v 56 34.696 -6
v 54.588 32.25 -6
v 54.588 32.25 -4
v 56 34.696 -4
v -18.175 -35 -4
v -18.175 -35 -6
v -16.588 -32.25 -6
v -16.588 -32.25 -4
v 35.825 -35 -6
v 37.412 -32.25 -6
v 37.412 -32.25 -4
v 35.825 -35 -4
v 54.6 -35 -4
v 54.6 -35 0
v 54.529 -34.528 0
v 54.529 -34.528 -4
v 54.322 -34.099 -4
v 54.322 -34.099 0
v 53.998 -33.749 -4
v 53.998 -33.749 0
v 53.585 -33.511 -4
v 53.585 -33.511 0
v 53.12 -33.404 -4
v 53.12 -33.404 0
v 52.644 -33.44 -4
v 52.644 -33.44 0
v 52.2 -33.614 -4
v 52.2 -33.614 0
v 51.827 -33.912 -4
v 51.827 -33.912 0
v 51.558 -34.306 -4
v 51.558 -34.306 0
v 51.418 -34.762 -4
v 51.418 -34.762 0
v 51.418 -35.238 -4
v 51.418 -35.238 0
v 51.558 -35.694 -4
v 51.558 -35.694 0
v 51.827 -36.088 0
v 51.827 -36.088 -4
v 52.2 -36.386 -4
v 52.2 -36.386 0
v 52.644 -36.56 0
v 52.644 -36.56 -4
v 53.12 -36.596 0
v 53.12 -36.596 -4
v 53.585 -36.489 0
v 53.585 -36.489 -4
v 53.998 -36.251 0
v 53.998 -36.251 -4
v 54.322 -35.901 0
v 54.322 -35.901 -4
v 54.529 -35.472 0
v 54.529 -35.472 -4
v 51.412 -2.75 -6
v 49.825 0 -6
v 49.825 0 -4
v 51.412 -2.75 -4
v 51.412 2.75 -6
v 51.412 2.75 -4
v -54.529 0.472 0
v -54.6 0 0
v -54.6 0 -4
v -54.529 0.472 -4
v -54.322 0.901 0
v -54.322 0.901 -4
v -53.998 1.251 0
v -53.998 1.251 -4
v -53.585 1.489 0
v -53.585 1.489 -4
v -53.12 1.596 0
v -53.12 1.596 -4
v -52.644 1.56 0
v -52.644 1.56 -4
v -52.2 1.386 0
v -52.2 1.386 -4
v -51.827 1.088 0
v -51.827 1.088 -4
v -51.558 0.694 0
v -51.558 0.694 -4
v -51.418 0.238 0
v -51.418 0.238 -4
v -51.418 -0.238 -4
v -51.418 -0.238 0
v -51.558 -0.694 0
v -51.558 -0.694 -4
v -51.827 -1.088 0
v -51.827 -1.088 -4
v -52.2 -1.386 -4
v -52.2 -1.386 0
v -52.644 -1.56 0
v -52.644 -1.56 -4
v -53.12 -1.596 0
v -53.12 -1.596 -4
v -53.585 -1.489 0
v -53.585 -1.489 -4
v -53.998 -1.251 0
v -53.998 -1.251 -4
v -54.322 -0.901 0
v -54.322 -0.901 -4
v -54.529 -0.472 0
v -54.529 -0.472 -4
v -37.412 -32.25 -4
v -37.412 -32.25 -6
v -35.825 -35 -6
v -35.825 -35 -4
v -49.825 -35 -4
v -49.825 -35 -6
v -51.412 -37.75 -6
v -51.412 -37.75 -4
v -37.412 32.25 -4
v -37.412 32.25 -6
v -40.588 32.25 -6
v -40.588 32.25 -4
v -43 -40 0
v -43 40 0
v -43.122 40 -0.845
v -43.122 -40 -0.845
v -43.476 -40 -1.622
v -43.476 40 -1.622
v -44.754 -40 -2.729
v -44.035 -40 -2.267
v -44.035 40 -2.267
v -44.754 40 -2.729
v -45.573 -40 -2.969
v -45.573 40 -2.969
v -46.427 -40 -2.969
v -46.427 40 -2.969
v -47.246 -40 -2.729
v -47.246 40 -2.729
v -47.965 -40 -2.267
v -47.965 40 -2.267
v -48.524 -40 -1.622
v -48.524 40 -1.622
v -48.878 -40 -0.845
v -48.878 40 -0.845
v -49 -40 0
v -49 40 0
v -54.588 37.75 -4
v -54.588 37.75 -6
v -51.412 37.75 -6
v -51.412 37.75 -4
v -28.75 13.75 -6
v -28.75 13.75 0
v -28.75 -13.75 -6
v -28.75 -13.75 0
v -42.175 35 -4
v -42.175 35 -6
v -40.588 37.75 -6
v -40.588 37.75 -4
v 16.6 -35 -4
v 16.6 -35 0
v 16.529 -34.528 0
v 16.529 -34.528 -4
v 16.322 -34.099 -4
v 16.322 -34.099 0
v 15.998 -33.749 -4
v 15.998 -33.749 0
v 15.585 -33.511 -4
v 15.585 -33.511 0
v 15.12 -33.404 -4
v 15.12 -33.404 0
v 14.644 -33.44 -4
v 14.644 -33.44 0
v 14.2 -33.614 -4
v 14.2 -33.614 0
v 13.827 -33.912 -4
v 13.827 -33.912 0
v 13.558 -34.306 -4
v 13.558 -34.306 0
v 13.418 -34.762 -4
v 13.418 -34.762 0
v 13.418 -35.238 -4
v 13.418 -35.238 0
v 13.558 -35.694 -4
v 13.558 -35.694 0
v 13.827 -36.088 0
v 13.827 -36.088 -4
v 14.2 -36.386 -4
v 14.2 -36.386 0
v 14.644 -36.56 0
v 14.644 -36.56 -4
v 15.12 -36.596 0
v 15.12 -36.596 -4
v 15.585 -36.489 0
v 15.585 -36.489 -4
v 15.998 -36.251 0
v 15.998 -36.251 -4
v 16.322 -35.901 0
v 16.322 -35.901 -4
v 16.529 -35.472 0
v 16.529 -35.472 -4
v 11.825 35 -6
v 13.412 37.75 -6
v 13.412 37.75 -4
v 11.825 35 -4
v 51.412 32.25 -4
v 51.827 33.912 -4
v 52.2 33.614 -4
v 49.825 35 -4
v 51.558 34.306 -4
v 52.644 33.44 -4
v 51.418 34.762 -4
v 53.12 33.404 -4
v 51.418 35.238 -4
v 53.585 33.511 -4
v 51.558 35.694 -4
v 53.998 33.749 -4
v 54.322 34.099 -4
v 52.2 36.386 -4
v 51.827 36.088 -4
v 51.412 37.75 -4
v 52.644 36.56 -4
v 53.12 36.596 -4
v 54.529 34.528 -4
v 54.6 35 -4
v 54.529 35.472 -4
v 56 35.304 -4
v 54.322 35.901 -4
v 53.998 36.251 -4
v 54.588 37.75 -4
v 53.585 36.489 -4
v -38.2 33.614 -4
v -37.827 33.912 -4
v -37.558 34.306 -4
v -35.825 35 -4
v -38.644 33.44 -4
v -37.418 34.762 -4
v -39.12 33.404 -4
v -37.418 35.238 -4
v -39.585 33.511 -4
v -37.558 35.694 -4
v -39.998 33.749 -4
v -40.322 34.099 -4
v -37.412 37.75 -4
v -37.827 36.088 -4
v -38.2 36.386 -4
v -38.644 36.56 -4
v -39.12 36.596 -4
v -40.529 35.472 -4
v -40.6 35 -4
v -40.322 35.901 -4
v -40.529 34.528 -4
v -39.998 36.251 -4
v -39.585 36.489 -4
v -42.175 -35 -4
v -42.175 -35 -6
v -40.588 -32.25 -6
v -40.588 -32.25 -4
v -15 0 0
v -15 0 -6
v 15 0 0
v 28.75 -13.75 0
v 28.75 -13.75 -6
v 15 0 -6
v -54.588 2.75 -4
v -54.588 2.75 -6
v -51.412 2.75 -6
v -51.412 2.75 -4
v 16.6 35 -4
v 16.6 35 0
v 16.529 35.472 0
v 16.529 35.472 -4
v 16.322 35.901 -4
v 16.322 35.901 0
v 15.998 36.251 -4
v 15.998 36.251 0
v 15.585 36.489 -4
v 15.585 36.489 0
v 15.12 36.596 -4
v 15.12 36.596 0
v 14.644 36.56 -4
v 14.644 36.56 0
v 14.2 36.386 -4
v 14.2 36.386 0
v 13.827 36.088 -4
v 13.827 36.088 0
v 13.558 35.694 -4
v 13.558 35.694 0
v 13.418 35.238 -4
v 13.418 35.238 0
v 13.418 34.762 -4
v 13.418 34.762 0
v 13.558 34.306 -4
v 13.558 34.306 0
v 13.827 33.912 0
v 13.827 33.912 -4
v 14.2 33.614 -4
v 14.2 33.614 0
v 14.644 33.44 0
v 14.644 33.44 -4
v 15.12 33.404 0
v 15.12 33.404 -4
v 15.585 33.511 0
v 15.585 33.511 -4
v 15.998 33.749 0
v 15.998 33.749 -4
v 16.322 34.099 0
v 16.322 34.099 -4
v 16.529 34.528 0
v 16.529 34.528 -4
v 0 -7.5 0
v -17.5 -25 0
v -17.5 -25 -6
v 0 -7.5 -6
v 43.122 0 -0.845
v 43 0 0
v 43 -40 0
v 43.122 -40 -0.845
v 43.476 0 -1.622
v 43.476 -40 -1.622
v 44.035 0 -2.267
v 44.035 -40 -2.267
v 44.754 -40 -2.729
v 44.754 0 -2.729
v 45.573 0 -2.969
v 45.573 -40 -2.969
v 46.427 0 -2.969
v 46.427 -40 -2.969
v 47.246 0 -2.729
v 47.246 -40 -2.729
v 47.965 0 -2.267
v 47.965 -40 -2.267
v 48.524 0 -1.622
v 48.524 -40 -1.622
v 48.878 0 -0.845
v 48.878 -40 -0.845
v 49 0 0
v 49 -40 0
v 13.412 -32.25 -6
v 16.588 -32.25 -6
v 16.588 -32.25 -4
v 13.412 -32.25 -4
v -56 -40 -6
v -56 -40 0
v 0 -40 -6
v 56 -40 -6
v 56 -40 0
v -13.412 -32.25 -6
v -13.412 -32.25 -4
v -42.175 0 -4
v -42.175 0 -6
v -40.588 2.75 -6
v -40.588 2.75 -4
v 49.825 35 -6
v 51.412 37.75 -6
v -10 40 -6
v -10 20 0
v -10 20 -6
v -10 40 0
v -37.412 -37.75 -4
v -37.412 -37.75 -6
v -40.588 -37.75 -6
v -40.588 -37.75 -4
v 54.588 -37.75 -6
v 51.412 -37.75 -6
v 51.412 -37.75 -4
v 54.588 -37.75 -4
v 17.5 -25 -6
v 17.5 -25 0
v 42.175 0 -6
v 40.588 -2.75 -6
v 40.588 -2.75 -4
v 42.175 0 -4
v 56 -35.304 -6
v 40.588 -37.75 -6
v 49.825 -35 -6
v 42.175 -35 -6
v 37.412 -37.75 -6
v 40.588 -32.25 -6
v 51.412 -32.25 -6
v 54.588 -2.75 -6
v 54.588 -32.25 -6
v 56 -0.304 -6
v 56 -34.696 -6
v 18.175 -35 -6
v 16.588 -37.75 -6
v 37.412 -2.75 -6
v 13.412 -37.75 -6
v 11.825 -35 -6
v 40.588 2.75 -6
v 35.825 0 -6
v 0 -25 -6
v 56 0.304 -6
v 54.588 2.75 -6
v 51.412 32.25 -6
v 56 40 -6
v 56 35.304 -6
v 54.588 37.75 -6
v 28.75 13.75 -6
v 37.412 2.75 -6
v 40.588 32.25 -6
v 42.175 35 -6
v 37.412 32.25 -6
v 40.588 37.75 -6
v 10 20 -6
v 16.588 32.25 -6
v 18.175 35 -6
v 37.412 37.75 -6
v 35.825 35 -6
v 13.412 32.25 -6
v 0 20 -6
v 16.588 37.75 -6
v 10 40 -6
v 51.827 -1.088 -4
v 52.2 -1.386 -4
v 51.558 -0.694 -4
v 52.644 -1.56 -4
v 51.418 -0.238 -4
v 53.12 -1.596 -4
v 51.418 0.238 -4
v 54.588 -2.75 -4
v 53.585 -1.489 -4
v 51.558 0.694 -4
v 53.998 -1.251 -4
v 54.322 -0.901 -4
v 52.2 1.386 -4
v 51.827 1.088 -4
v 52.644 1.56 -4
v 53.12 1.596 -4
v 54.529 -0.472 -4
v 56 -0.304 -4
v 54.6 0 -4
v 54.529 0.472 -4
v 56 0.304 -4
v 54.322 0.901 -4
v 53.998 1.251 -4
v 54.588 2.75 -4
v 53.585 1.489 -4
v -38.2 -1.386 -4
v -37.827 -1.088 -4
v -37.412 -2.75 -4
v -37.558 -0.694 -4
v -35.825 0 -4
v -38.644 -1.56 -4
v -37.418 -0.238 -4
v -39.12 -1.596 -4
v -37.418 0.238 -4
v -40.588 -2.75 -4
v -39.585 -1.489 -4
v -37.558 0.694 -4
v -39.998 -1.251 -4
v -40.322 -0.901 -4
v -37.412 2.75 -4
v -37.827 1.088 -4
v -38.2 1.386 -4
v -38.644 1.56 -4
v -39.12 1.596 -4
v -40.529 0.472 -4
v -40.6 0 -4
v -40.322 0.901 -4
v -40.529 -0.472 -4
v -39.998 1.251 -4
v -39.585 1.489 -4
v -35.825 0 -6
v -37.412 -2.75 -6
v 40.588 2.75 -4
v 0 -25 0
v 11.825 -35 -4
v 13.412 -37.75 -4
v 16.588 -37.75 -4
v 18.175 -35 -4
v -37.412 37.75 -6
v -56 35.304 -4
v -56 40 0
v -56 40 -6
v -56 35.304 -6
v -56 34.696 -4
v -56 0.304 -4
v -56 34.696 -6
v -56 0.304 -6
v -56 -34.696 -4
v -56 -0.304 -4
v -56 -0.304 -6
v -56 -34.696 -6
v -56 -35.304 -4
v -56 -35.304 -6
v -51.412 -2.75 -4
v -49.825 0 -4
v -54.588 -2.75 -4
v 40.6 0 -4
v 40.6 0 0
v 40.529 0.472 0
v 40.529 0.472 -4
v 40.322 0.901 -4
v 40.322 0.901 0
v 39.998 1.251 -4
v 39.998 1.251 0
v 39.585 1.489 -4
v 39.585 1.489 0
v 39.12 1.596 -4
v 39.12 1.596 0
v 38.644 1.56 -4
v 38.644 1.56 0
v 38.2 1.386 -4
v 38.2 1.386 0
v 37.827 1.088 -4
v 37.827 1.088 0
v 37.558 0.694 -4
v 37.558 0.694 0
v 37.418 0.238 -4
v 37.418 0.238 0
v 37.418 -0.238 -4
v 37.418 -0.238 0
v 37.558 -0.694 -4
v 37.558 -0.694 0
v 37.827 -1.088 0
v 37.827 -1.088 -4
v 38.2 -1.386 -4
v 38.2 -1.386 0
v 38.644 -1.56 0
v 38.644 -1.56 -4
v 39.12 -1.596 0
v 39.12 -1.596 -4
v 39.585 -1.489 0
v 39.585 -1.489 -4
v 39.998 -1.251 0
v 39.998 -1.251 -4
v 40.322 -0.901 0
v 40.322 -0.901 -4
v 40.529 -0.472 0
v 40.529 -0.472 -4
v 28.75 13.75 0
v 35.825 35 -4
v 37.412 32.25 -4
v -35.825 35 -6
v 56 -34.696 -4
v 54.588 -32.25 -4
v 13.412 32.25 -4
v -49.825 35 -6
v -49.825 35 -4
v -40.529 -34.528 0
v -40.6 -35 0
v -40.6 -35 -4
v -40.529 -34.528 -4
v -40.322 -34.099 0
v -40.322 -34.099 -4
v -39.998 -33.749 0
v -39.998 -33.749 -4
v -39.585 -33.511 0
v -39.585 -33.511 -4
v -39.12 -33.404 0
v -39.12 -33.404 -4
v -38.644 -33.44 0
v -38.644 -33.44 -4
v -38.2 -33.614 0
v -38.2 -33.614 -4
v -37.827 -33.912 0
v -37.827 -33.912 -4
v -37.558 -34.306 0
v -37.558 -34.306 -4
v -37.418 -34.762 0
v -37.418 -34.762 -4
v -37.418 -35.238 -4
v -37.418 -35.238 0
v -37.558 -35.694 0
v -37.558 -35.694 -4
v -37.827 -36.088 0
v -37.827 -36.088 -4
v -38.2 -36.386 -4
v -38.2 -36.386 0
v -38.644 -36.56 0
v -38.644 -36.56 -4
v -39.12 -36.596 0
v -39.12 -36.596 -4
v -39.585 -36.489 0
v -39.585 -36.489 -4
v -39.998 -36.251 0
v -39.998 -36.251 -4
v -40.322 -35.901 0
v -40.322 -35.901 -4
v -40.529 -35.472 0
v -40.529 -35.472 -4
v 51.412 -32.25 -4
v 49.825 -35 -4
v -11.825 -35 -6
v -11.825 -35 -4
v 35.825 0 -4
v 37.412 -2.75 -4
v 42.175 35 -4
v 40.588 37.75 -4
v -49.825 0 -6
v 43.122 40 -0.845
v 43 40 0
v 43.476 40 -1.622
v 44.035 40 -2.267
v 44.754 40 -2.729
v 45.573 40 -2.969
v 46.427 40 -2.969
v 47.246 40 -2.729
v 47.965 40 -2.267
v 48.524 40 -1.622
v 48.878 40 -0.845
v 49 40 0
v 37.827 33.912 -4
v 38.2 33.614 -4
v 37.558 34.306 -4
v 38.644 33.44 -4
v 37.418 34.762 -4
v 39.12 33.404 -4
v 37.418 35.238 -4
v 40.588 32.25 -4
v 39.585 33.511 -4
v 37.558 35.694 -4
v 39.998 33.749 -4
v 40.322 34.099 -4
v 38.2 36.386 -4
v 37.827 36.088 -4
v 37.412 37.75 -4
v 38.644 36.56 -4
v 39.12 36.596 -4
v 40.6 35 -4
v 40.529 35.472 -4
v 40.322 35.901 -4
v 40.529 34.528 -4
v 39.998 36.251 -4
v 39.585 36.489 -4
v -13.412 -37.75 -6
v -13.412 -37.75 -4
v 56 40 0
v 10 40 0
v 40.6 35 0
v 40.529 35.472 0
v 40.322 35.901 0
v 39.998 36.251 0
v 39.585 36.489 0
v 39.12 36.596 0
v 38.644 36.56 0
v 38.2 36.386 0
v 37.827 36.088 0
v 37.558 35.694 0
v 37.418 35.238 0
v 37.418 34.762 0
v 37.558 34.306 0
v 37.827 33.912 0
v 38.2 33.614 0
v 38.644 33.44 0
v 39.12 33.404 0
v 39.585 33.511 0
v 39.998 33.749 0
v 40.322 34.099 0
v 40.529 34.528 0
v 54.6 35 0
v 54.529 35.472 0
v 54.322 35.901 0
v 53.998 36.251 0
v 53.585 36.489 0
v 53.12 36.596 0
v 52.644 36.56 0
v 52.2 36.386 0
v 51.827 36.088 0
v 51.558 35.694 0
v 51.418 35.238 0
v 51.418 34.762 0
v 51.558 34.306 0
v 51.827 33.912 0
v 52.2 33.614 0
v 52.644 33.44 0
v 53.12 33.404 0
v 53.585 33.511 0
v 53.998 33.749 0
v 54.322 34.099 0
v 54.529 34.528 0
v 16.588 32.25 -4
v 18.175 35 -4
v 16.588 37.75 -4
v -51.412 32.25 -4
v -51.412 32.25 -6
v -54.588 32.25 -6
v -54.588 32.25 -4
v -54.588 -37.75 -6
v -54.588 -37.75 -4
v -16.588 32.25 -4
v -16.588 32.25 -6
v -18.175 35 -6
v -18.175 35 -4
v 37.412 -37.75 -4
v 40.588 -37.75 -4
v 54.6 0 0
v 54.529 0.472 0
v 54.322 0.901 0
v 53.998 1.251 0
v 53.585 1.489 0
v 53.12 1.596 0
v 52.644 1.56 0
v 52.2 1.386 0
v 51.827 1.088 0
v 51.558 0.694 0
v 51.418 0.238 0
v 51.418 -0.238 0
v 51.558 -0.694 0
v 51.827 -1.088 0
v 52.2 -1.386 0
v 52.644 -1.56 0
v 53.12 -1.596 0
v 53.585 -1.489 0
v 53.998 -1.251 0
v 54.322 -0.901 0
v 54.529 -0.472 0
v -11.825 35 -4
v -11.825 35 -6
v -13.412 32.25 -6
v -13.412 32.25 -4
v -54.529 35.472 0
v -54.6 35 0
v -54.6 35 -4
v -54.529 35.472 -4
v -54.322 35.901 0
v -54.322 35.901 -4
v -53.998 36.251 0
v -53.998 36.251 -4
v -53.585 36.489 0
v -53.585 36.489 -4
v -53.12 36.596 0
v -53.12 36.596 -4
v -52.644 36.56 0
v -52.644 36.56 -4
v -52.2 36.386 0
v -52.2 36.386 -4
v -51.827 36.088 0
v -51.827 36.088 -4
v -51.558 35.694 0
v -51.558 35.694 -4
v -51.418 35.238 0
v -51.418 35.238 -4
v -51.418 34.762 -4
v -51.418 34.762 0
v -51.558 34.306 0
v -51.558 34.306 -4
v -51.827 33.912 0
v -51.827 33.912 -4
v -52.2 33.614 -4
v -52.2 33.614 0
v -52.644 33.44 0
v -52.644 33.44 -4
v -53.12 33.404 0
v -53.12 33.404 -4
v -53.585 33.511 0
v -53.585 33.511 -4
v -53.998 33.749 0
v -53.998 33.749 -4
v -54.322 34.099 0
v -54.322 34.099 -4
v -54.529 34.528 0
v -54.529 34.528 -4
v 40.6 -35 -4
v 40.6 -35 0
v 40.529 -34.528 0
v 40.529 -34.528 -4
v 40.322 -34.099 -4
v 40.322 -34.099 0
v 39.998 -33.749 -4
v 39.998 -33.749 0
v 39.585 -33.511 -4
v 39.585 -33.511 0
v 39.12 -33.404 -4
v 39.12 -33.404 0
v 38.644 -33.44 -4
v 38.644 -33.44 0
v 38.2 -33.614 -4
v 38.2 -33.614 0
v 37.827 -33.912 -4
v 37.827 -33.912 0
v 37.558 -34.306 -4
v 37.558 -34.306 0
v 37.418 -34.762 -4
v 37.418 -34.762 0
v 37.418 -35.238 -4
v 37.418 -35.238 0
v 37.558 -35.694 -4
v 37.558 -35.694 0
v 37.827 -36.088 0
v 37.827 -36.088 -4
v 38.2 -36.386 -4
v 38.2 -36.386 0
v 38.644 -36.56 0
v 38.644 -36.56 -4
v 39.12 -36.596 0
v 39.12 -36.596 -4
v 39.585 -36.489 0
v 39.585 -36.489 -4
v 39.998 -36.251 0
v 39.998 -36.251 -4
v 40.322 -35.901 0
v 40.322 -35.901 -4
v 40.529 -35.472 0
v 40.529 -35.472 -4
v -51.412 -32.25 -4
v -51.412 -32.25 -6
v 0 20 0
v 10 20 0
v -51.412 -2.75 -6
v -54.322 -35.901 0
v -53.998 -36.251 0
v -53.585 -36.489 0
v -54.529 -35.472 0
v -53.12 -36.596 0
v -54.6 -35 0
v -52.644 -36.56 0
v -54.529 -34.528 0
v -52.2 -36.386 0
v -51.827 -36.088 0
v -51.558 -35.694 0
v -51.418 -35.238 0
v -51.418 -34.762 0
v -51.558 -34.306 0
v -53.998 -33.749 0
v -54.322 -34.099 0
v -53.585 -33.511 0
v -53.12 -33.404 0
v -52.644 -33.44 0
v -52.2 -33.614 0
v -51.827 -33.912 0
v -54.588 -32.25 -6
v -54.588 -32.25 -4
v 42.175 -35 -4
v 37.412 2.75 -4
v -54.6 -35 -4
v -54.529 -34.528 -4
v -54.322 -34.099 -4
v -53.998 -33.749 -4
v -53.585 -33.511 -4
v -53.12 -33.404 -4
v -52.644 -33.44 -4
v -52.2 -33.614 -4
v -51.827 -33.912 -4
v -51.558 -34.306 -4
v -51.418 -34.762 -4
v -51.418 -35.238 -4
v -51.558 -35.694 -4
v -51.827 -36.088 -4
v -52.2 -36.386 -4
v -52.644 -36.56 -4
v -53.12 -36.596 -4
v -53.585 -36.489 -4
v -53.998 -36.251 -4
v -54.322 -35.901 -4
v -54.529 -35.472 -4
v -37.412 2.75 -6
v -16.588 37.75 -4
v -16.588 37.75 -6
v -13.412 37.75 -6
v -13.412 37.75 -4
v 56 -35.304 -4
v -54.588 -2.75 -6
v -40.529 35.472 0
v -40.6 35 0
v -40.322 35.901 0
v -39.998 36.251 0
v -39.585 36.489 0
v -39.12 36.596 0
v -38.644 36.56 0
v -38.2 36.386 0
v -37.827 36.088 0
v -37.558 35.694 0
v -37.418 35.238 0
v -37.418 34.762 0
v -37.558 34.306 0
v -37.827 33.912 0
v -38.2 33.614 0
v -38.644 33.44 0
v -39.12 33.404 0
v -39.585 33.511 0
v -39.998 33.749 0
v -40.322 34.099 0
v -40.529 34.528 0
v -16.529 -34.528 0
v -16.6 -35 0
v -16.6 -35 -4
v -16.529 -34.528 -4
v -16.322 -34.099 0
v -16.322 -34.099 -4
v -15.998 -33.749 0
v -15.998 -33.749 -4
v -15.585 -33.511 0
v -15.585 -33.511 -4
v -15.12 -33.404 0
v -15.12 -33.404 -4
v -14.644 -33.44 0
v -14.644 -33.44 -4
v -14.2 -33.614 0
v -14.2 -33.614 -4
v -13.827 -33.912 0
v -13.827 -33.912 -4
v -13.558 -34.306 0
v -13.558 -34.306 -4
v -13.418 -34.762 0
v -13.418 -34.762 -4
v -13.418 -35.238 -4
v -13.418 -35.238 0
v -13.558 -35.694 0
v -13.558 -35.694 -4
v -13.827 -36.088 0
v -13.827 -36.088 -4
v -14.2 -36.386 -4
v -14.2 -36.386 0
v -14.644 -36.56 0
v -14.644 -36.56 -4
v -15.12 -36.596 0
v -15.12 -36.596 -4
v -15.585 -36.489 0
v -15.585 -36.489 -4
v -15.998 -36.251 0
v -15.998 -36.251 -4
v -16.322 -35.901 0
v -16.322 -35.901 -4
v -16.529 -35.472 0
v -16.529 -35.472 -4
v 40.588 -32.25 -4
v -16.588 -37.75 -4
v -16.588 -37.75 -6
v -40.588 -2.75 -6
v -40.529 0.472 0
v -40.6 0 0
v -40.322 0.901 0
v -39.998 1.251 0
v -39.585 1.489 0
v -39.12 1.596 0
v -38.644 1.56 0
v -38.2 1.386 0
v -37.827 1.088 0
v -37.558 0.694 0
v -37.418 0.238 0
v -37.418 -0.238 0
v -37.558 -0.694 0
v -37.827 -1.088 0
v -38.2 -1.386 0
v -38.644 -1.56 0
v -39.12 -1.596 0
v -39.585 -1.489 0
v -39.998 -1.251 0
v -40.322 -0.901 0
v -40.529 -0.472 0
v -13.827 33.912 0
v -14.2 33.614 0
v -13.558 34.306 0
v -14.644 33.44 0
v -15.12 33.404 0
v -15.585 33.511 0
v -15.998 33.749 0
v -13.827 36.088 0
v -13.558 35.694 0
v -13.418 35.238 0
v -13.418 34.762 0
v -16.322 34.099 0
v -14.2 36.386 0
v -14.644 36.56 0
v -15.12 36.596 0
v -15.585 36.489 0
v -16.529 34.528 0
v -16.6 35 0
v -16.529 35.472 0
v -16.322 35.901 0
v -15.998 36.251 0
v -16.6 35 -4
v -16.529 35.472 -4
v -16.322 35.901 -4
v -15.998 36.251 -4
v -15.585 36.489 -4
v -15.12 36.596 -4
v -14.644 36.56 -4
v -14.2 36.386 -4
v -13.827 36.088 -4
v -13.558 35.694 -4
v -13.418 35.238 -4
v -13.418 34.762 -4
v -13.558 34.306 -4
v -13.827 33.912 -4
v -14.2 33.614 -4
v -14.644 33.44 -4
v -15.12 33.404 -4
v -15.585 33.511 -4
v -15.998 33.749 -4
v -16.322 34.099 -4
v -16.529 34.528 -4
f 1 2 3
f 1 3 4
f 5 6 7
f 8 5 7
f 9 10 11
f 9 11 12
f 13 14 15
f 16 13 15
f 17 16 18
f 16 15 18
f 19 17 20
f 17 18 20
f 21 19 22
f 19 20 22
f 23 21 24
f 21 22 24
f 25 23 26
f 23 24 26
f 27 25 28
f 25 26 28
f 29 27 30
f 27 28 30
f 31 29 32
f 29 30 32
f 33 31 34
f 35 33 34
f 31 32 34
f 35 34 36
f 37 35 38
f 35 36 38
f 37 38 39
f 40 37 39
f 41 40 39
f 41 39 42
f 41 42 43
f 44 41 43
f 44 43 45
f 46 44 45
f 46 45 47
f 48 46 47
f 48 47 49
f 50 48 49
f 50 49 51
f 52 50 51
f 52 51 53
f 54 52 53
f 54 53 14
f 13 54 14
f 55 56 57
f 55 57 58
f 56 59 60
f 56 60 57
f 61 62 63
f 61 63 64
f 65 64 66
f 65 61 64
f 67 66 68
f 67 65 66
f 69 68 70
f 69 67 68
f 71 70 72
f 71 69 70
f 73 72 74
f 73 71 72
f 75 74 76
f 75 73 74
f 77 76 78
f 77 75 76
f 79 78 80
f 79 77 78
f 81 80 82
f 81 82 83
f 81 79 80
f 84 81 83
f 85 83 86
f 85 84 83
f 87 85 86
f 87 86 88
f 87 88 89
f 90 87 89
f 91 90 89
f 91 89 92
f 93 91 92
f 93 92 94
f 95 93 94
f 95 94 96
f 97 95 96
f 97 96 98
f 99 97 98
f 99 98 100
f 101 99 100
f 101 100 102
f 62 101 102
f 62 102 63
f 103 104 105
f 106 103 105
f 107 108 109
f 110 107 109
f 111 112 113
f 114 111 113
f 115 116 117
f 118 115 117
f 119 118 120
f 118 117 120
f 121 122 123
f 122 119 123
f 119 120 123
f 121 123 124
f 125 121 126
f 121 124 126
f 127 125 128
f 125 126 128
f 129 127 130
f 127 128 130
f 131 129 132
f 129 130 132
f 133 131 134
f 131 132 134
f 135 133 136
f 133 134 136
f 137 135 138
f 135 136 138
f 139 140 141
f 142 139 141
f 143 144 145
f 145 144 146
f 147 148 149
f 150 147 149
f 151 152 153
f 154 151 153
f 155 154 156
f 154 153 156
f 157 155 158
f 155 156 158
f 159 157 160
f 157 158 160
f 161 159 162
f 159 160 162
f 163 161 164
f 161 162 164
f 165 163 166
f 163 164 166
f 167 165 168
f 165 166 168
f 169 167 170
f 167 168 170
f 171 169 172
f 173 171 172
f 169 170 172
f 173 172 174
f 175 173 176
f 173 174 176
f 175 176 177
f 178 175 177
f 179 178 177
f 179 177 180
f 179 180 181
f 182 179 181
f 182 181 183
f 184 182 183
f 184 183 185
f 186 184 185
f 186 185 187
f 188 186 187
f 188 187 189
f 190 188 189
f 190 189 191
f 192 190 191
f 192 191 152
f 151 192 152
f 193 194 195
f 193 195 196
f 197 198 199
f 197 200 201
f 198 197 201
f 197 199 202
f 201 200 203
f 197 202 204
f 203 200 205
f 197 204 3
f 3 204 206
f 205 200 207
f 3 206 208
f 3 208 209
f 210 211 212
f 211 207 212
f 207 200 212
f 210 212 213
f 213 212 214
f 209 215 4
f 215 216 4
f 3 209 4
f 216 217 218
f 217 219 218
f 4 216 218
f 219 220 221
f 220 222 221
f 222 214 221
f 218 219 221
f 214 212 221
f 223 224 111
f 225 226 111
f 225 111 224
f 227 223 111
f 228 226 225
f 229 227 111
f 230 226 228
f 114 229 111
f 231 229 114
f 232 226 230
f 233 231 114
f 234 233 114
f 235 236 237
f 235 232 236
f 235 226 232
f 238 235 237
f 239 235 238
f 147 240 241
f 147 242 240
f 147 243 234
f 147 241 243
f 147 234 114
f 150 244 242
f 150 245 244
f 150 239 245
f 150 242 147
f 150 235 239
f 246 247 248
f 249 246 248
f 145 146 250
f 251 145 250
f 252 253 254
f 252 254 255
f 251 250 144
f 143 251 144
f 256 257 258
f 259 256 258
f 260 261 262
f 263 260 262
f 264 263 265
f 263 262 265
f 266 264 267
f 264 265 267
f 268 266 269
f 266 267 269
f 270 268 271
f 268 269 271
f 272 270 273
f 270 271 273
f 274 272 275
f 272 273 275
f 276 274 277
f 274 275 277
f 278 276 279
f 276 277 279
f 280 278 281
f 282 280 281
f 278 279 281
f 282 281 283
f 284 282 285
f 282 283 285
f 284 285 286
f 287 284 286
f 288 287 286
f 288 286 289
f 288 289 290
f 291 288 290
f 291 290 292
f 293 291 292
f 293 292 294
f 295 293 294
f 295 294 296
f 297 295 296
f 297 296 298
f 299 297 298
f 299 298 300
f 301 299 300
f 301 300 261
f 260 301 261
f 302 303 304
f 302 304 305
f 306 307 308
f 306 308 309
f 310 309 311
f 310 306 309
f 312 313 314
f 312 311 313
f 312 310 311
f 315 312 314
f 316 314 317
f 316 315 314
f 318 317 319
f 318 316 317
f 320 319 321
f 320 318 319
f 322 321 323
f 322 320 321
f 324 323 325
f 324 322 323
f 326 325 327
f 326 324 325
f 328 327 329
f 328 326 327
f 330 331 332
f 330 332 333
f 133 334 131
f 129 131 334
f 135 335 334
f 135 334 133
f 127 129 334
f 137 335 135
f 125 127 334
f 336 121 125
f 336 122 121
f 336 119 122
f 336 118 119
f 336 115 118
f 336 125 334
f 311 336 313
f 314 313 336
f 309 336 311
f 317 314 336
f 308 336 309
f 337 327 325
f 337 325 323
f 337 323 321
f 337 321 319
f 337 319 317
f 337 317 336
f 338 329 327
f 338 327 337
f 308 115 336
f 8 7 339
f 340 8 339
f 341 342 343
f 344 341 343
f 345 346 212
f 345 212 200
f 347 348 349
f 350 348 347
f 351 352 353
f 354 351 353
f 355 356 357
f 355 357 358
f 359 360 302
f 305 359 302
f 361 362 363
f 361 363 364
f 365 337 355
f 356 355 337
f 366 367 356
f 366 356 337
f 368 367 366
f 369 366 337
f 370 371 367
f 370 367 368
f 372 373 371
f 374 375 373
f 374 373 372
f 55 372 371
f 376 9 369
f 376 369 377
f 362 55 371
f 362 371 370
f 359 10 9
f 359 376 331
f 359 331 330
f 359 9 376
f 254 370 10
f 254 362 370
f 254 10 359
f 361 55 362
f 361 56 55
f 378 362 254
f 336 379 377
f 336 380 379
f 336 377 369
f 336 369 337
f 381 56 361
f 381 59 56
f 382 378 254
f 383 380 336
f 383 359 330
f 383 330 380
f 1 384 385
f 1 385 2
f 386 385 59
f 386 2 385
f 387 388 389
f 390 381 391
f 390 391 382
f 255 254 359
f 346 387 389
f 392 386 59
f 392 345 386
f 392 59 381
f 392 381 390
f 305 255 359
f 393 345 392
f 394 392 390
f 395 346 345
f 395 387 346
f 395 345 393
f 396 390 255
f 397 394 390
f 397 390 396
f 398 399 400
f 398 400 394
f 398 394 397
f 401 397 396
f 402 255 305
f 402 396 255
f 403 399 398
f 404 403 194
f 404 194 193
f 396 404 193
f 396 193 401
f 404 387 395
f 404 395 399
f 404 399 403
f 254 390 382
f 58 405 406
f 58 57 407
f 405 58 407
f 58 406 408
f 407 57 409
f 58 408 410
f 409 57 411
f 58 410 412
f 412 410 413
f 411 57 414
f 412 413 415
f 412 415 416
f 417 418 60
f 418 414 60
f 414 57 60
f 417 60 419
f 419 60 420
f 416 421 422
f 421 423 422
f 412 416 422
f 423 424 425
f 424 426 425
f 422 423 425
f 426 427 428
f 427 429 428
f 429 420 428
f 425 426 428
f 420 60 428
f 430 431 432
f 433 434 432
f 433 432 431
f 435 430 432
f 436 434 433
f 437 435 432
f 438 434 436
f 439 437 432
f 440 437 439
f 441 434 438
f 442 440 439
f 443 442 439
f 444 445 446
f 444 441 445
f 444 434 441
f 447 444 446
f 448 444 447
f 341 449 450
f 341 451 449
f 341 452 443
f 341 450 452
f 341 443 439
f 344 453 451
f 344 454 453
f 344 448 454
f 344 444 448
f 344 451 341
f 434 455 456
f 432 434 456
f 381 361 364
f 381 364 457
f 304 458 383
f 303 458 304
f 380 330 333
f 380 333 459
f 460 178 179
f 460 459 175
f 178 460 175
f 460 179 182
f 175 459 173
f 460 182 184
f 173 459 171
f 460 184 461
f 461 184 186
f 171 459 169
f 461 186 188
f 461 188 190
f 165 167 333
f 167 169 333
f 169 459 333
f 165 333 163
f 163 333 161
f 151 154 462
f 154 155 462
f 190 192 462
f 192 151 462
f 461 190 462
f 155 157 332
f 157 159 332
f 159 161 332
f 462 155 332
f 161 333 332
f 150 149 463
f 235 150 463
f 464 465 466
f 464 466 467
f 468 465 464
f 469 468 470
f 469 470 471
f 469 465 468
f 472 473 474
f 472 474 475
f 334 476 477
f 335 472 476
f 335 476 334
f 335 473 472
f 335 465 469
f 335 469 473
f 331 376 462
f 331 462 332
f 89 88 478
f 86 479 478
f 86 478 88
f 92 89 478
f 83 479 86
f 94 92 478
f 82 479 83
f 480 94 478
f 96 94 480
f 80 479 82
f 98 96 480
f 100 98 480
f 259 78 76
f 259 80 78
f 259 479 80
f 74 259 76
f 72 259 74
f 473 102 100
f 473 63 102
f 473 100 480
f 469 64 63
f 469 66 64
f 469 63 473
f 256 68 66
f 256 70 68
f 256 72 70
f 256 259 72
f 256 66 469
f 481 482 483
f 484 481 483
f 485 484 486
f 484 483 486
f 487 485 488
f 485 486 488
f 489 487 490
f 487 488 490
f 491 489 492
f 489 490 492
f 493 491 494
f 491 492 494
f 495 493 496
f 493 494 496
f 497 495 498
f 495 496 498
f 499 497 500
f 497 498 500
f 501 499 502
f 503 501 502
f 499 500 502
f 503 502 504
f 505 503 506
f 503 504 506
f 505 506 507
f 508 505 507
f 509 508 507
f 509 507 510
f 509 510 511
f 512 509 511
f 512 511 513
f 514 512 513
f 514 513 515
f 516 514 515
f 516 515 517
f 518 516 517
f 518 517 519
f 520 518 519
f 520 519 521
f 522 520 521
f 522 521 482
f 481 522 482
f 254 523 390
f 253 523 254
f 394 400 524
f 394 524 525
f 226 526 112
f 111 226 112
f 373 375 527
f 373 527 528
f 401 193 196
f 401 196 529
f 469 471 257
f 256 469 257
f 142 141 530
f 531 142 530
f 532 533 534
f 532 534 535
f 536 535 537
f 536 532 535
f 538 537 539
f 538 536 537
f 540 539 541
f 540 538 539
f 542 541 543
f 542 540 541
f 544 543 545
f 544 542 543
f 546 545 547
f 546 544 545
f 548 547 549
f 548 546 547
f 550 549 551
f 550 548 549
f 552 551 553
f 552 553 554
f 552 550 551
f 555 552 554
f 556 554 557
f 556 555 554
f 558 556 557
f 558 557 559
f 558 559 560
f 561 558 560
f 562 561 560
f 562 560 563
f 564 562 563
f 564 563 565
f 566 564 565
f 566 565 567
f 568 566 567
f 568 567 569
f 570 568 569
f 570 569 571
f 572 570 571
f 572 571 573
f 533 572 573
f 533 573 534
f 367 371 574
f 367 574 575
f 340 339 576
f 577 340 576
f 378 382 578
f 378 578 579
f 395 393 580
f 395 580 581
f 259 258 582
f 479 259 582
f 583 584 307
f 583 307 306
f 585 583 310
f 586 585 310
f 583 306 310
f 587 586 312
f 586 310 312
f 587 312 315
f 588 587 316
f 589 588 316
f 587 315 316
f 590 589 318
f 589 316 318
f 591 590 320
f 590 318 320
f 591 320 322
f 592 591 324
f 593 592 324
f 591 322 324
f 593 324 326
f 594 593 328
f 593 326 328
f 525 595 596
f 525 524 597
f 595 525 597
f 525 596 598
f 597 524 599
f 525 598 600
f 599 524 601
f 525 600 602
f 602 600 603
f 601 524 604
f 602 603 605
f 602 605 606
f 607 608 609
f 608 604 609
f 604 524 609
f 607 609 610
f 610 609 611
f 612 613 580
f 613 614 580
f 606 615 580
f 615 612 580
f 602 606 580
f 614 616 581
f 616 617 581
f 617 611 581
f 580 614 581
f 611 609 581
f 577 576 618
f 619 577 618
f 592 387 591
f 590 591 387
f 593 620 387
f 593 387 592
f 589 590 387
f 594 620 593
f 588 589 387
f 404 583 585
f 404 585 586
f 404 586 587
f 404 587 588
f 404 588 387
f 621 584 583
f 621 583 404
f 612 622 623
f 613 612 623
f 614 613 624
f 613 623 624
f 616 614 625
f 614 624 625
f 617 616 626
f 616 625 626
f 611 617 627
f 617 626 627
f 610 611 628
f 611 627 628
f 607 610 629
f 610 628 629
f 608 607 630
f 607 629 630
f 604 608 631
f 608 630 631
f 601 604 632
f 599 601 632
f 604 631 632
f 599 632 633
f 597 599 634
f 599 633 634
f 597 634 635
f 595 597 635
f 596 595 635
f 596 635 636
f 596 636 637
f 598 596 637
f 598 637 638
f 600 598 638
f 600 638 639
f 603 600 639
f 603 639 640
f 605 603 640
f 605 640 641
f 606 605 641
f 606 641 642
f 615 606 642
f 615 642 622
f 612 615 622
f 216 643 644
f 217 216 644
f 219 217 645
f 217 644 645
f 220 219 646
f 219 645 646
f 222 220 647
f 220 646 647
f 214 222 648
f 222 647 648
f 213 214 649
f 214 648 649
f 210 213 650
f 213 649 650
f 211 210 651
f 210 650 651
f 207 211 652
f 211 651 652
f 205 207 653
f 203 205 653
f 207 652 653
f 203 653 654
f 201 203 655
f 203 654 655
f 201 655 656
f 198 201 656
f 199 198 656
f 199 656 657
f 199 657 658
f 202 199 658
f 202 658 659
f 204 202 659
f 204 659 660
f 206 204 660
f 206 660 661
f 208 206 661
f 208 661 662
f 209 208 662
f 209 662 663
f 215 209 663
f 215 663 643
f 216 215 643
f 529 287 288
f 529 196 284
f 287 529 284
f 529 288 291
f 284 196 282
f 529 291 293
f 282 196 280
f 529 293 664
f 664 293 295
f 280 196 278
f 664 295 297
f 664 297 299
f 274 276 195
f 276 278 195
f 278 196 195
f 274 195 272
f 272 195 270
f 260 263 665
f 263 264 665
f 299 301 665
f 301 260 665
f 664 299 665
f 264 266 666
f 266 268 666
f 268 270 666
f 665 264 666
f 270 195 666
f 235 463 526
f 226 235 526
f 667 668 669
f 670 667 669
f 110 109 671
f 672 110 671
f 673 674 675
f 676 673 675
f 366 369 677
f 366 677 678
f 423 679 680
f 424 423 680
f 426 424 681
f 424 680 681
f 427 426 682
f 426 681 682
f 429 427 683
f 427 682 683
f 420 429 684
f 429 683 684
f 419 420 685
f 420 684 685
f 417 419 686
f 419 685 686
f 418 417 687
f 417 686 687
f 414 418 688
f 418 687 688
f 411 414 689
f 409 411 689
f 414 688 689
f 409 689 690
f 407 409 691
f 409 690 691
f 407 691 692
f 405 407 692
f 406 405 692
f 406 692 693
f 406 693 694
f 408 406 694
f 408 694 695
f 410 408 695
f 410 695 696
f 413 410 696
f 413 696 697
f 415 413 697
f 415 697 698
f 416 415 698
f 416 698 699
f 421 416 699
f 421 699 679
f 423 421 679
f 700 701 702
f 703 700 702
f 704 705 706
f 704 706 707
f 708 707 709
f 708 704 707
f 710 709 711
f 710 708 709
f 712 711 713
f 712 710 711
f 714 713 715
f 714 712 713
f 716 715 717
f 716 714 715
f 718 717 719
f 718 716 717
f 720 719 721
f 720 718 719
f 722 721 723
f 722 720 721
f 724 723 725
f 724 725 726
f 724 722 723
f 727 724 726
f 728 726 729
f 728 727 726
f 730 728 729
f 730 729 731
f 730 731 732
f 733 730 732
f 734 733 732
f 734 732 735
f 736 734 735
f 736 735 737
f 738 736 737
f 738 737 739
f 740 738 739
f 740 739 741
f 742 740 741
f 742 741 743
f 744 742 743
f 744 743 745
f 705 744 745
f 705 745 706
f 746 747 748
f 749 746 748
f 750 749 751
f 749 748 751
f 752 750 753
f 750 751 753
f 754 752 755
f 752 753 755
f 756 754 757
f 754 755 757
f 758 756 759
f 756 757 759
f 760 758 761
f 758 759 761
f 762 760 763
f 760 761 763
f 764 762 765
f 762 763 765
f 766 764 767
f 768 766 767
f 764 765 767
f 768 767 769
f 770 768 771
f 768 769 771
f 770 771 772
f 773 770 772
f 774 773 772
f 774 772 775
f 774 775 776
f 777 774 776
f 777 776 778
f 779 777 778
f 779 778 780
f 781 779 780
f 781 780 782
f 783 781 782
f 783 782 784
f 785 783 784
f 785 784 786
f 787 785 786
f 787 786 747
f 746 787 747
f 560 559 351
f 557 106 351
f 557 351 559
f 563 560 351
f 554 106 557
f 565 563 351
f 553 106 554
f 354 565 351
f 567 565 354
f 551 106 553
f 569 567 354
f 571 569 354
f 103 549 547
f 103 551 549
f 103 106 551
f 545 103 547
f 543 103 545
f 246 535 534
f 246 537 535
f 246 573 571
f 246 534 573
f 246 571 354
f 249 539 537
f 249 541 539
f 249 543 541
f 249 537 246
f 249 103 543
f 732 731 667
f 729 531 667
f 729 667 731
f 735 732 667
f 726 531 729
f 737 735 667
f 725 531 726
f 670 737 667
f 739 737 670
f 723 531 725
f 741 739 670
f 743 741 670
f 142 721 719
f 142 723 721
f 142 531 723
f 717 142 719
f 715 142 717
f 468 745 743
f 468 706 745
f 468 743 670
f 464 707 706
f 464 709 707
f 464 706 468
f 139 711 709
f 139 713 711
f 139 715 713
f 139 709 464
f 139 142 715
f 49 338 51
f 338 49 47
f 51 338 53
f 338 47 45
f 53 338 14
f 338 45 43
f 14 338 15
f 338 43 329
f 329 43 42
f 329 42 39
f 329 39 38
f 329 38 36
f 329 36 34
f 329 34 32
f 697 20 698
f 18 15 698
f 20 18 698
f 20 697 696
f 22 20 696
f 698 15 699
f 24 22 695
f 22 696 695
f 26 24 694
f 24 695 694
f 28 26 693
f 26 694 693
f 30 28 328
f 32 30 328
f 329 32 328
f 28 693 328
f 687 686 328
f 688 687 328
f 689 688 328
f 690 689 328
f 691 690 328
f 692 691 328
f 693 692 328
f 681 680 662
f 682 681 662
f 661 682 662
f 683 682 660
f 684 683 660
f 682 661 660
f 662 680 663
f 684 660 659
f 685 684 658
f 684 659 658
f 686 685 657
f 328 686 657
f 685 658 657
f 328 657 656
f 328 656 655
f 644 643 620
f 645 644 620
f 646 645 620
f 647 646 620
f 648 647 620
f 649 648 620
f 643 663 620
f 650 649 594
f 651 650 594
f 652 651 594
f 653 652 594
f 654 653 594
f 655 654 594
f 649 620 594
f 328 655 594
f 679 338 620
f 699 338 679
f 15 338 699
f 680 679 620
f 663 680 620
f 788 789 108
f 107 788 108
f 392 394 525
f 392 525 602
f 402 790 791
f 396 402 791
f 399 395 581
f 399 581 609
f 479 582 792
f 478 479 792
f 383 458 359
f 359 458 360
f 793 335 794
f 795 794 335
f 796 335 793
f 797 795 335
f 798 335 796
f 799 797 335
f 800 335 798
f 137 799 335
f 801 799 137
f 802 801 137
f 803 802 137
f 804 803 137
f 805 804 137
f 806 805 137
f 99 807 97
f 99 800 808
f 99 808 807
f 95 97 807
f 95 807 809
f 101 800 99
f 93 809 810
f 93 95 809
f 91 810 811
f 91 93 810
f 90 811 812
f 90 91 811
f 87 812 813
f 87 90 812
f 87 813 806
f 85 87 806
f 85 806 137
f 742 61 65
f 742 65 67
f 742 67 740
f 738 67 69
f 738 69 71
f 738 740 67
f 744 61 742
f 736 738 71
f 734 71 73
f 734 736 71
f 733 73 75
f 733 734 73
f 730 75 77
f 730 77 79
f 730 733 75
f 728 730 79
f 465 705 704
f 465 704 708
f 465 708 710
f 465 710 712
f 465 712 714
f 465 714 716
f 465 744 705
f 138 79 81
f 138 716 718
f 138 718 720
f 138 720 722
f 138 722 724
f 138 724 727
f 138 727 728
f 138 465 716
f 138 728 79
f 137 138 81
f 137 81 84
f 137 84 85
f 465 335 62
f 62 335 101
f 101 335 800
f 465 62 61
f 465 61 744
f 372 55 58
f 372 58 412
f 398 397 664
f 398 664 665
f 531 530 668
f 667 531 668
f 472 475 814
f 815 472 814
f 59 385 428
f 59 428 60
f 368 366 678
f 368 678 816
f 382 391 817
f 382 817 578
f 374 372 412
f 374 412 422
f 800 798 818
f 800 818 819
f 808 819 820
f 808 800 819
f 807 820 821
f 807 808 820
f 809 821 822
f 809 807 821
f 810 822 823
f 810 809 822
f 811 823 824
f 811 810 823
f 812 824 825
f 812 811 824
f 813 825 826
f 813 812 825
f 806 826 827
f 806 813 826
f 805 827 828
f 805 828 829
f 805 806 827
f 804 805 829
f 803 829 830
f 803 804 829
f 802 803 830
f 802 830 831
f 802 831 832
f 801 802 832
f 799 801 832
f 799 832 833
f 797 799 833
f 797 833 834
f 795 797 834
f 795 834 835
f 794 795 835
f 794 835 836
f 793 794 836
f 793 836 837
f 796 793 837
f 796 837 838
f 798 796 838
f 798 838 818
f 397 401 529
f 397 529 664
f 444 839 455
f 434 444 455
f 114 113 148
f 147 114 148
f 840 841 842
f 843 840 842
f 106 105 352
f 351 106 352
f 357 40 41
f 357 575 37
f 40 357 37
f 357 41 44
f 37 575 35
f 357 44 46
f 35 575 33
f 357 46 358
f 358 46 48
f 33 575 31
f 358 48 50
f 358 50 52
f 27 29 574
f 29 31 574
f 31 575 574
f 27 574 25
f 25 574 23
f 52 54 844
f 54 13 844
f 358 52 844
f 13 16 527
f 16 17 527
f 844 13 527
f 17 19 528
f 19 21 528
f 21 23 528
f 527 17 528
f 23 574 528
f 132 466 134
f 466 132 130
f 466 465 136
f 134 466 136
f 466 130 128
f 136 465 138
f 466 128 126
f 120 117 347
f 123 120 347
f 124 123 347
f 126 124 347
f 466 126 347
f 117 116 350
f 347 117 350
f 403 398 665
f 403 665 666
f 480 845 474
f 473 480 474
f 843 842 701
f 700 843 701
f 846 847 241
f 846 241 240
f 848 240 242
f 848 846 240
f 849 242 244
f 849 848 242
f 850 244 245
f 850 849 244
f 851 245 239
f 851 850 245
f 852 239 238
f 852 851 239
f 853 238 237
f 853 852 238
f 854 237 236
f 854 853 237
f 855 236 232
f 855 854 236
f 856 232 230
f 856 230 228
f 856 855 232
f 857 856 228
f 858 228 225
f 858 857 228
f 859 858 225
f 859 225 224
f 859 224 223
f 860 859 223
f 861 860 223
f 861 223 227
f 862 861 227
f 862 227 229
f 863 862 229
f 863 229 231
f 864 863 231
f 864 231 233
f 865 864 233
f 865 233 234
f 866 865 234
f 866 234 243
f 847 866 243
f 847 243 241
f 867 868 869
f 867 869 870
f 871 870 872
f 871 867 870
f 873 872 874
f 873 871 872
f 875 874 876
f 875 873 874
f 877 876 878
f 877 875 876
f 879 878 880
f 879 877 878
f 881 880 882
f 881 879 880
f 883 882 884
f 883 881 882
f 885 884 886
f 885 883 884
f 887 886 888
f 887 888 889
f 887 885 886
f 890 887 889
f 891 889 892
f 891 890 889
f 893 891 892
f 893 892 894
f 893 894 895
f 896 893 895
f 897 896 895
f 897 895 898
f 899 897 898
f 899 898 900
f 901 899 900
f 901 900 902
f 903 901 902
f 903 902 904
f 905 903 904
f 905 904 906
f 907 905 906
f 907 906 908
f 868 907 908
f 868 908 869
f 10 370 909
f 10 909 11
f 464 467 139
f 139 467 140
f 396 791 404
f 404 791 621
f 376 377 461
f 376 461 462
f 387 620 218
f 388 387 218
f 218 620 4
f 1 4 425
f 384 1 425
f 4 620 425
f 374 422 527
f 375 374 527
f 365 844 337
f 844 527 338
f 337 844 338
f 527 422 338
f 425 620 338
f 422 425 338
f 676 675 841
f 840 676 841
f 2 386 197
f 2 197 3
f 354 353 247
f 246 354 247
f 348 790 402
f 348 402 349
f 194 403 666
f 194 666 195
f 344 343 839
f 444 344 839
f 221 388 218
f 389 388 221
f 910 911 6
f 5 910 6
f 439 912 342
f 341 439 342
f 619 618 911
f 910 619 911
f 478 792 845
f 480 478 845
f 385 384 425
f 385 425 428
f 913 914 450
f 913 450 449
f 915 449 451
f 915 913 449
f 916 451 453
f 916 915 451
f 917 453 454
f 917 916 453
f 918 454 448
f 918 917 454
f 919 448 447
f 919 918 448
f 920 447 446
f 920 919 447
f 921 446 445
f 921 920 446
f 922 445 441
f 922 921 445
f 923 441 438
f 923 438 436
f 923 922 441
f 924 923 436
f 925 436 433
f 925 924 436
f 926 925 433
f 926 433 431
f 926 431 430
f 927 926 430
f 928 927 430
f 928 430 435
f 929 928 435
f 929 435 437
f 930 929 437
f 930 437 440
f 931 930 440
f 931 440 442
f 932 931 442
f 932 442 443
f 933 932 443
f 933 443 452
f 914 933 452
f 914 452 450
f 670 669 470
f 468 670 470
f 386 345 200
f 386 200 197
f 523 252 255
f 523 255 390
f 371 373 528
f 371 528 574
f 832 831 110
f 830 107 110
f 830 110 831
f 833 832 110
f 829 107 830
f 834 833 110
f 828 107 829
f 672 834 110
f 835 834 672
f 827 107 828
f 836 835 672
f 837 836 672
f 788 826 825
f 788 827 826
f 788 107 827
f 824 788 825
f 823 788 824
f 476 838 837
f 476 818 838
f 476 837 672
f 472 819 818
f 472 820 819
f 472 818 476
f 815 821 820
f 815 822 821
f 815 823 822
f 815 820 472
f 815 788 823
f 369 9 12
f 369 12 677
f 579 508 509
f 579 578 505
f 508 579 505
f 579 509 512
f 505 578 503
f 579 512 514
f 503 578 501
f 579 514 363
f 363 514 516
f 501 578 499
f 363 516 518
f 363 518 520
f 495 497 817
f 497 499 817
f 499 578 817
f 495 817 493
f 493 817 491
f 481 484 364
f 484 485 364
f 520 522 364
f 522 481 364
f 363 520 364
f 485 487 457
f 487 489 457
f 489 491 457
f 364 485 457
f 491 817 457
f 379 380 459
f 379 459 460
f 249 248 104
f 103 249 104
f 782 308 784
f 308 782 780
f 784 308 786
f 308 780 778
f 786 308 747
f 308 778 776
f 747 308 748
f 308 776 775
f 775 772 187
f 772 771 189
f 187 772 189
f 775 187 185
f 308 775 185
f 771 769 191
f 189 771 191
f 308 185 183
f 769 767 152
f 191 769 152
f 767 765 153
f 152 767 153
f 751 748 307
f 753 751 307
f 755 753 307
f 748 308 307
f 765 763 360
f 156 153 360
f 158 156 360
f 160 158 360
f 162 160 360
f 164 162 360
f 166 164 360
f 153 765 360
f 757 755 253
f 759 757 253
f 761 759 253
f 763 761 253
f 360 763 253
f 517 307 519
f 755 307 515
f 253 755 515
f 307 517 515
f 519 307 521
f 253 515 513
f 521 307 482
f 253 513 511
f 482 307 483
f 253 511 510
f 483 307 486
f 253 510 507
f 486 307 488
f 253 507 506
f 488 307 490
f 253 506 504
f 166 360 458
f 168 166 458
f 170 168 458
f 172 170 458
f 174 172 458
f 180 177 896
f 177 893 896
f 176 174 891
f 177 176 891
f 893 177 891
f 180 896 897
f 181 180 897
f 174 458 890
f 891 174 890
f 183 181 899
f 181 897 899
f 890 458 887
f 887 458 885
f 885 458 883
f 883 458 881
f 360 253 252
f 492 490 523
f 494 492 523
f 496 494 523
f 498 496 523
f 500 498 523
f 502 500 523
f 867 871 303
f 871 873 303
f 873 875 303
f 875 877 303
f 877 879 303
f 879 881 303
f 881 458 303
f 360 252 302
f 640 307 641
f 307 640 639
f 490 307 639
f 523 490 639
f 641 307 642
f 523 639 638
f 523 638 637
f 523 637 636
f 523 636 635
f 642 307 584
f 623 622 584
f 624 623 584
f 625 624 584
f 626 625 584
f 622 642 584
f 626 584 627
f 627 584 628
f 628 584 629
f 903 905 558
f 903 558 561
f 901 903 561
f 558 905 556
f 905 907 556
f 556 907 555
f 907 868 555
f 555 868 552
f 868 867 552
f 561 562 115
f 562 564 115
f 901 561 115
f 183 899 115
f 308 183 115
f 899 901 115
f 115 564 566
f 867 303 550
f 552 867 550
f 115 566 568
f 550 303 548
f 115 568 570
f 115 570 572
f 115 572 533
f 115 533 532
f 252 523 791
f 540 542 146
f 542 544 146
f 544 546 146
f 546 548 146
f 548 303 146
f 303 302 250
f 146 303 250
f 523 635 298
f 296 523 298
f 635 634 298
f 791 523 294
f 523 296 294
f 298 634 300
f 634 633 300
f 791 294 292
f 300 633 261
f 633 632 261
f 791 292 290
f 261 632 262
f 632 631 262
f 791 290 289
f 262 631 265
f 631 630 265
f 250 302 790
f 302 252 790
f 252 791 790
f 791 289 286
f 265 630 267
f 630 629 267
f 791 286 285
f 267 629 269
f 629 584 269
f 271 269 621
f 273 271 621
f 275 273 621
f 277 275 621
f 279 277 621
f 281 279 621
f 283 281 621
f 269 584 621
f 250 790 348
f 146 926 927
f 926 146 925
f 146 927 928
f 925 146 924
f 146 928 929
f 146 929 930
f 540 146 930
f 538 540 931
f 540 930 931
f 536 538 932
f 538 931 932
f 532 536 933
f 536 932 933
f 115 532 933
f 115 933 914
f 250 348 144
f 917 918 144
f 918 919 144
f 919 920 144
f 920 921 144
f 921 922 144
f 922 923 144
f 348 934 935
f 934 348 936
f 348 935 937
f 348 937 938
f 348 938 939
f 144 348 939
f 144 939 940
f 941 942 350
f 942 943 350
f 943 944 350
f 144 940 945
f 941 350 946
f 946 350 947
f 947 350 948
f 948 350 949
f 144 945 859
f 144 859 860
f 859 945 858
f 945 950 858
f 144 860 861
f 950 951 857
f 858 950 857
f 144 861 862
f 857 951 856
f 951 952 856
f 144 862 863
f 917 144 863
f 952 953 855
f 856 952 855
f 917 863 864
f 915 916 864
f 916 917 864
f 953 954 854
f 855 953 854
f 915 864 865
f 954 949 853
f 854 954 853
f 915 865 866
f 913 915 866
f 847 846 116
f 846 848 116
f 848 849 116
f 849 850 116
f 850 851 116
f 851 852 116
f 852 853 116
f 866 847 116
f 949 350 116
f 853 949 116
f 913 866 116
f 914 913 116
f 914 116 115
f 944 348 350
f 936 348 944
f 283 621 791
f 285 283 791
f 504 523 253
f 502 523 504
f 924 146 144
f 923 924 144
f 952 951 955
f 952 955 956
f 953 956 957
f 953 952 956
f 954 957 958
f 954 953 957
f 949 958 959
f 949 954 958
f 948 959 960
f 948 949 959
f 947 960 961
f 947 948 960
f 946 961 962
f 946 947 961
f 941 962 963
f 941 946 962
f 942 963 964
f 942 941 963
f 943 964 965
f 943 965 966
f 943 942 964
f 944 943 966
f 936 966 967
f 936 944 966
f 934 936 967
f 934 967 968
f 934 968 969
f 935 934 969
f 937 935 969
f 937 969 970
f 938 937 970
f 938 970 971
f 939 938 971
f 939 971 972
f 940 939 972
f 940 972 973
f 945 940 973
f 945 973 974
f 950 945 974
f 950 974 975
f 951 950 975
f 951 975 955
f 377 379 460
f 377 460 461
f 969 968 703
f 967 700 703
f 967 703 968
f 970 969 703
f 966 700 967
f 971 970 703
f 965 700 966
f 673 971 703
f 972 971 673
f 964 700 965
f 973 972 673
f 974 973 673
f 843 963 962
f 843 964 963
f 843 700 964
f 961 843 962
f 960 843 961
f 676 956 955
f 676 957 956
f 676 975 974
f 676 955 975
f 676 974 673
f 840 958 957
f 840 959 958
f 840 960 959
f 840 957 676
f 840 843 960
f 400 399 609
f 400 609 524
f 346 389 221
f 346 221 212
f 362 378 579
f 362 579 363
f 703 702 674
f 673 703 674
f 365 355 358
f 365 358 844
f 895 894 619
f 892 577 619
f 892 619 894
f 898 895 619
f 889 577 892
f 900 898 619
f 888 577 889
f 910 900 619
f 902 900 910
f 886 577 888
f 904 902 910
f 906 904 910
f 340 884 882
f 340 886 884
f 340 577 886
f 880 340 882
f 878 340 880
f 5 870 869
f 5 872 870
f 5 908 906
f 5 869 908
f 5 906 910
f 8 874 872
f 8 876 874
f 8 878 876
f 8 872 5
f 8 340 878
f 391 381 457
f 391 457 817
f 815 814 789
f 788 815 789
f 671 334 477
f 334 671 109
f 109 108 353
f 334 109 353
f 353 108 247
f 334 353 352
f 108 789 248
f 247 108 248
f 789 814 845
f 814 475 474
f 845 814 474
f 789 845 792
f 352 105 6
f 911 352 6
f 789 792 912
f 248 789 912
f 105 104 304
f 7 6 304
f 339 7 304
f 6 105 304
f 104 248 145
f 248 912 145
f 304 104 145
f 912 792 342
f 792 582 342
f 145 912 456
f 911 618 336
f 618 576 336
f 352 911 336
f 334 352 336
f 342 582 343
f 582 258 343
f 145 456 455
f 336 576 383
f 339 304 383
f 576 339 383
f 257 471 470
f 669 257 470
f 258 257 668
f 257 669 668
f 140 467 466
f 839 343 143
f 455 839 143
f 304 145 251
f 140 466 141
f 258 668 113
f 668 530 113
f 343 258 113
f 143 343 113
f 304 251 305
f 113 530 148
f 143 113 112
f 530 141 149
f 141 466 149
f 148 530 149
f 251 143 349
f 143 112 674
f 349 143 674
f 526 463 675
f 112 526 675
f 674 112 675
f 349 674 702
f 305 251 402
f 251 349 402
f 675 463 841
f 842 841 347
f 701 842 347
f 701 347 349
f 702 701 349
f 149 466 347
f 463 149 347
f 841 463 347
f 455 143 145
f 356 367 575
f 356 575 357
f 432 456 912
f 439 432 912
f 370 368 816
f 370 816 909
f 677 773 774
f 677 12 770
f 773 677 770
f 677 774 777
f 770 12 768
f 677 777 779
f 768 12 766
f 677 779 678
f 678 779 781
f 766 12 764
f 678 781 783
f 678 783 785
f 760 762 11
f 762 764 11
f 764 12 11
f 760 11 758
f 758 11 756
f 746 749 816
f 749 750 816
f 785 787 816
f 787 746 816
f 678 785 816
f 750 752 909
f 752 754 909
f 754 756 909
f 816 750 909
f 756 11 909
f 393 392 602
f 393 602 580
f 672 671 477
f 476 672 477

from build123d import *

# Parameters (mm, degrees)
SKETCH_R          = 1.6
PAD_DEPTH         = 6
SKETCH001_R       = 3
POCKET_DEPTH      = 40.001
POCKET_DEPTH_BACK = 40.001
POCKET001_DEPTH   = 2


with BuildPart() as toolbody:
    # Sketch → Pad (new body)
    with BuildSketch(Plane.XY):
        Polygon((46, -40), (0, -40), (0, -25), (17.5, -25), (0, -7.5), (0, 7.5), (0, 20), (10, 20), (10, 40), (46, 40), (56, 40), (56, -40), align=None)
        with Locations((53, 0)):
            Circle(SKETCH_R, mode=Mode.SUBTRACT)
        with Locations((53, 35)):
            Circle(SKETCH_R, mode=Mode.SUBTRACT)
        with Locations((53, -35)):
            Circle(SKETCH_R, mode=Mode.SUBTRACT)
        with Locations((39, 35)):
            Circle(SKETCH_R, mode=Mode.SUBTRACT)
        with Locations((39, 0)):
            Circle(SKETCH_R, mode=Mode.SUBTRACT)
        with Locations((39, -35)):
            Circle(SKETCH_R, mode=Mode.SUBTRACT)
        with Locations((15, 35)):
            Circle(SKETCH_R, mode=Mode.SUBTRACT)
        with Locations((15, -35)):
            Circle(SKETCH_R, mode=Mode.SUBTRACT)
        Polygon((15, 0), (28.75, 13.75), (28.75, -13.75), align=None, mode=Mode.SUBTRACT)
    extrude(amount=-PAD_DEPTH)

    # Sketch001 → Pocket (cut, two sides)
    with BuildSketch(Plane.XZ) as pocket_sk:
        with Locations((46, 0)):
            Circle(SKETCH001_R)
    extrude(amount=-POCKET_DEPTH, mode=Mode.SUBTRACT)
    extrude(pocket_sk.sketch, amount=POCKET_DEPTH_BACK, mode=Mode.SUBTRACT)

    # Sketch002 (on DatumPlane) → Pocket001 (cut)
    with BuildSketch(Plane.XY.offset(-6)):
        Polygon((16.587713, 32.25), (18.175426, 35), (16.587713, 37.75), (13.412287, 37.75), (11.824574, 35), (13.412287, 32.25), align=None)
        Polygon((40.587713, 32.25), (42.175426, 35), (40.587713, 37.75), (37.412287, 37.75), (35.824574, 35), (37.412287, 32.25), align=None)
        Polygon((54.587713, 32.25), (56.175426, 35), (54.587713, 37.75), (51.412287, 37.75), (49.824574, 35), (51.412287, 32.25), align=None)
        Polygon((54.587713, -2.75), (56.175426, 0), (54.587713, 2.75), (51.412287, 2.75), (49.824574, 0), (51.412287, -2.75), align=None)
        Polygon((40.587713, -2.75), (42.175426, 0), (40.587713, 2.75), (37.412287, 2.75), (35.824574, 0), (37.412287, -2.75), align=None)
        Polygon((54.587713, -37.75), (56.175426, -35), (54.587713, -32.25), (51.412287, -32.25), (49.824574, -35), (51.412287, -37.75), align=None)
        Polygon((40.587713, -37.75), (42.175426, -35), (40.587713, -32.25), (37.412287, -32.25), (35.824574, -35), (37.412287, -37.75), align=None)
        Polygon((16.587713, -37.75), (18.175426, -35), (16.587713, -32.25), (13.412287, -32.25), (11.824574, -35), (13.412287, -37.75), align=None)
    extrude(amount=POCKET001_DEPTH, mode=Mode.SUBTRACT)


with BuildPart() as toolfusion:
    # Part__Mirroring: instance of ToolBody
    add(toolbody.part.mirror(Plane(origin=(0, 0, 0), x_dir=(0, -1, 0), z_dir=(1, 0, 0))))

    # Fusion: union ToolBody
    add(toolbody.part)


solid = toolfusion.part
